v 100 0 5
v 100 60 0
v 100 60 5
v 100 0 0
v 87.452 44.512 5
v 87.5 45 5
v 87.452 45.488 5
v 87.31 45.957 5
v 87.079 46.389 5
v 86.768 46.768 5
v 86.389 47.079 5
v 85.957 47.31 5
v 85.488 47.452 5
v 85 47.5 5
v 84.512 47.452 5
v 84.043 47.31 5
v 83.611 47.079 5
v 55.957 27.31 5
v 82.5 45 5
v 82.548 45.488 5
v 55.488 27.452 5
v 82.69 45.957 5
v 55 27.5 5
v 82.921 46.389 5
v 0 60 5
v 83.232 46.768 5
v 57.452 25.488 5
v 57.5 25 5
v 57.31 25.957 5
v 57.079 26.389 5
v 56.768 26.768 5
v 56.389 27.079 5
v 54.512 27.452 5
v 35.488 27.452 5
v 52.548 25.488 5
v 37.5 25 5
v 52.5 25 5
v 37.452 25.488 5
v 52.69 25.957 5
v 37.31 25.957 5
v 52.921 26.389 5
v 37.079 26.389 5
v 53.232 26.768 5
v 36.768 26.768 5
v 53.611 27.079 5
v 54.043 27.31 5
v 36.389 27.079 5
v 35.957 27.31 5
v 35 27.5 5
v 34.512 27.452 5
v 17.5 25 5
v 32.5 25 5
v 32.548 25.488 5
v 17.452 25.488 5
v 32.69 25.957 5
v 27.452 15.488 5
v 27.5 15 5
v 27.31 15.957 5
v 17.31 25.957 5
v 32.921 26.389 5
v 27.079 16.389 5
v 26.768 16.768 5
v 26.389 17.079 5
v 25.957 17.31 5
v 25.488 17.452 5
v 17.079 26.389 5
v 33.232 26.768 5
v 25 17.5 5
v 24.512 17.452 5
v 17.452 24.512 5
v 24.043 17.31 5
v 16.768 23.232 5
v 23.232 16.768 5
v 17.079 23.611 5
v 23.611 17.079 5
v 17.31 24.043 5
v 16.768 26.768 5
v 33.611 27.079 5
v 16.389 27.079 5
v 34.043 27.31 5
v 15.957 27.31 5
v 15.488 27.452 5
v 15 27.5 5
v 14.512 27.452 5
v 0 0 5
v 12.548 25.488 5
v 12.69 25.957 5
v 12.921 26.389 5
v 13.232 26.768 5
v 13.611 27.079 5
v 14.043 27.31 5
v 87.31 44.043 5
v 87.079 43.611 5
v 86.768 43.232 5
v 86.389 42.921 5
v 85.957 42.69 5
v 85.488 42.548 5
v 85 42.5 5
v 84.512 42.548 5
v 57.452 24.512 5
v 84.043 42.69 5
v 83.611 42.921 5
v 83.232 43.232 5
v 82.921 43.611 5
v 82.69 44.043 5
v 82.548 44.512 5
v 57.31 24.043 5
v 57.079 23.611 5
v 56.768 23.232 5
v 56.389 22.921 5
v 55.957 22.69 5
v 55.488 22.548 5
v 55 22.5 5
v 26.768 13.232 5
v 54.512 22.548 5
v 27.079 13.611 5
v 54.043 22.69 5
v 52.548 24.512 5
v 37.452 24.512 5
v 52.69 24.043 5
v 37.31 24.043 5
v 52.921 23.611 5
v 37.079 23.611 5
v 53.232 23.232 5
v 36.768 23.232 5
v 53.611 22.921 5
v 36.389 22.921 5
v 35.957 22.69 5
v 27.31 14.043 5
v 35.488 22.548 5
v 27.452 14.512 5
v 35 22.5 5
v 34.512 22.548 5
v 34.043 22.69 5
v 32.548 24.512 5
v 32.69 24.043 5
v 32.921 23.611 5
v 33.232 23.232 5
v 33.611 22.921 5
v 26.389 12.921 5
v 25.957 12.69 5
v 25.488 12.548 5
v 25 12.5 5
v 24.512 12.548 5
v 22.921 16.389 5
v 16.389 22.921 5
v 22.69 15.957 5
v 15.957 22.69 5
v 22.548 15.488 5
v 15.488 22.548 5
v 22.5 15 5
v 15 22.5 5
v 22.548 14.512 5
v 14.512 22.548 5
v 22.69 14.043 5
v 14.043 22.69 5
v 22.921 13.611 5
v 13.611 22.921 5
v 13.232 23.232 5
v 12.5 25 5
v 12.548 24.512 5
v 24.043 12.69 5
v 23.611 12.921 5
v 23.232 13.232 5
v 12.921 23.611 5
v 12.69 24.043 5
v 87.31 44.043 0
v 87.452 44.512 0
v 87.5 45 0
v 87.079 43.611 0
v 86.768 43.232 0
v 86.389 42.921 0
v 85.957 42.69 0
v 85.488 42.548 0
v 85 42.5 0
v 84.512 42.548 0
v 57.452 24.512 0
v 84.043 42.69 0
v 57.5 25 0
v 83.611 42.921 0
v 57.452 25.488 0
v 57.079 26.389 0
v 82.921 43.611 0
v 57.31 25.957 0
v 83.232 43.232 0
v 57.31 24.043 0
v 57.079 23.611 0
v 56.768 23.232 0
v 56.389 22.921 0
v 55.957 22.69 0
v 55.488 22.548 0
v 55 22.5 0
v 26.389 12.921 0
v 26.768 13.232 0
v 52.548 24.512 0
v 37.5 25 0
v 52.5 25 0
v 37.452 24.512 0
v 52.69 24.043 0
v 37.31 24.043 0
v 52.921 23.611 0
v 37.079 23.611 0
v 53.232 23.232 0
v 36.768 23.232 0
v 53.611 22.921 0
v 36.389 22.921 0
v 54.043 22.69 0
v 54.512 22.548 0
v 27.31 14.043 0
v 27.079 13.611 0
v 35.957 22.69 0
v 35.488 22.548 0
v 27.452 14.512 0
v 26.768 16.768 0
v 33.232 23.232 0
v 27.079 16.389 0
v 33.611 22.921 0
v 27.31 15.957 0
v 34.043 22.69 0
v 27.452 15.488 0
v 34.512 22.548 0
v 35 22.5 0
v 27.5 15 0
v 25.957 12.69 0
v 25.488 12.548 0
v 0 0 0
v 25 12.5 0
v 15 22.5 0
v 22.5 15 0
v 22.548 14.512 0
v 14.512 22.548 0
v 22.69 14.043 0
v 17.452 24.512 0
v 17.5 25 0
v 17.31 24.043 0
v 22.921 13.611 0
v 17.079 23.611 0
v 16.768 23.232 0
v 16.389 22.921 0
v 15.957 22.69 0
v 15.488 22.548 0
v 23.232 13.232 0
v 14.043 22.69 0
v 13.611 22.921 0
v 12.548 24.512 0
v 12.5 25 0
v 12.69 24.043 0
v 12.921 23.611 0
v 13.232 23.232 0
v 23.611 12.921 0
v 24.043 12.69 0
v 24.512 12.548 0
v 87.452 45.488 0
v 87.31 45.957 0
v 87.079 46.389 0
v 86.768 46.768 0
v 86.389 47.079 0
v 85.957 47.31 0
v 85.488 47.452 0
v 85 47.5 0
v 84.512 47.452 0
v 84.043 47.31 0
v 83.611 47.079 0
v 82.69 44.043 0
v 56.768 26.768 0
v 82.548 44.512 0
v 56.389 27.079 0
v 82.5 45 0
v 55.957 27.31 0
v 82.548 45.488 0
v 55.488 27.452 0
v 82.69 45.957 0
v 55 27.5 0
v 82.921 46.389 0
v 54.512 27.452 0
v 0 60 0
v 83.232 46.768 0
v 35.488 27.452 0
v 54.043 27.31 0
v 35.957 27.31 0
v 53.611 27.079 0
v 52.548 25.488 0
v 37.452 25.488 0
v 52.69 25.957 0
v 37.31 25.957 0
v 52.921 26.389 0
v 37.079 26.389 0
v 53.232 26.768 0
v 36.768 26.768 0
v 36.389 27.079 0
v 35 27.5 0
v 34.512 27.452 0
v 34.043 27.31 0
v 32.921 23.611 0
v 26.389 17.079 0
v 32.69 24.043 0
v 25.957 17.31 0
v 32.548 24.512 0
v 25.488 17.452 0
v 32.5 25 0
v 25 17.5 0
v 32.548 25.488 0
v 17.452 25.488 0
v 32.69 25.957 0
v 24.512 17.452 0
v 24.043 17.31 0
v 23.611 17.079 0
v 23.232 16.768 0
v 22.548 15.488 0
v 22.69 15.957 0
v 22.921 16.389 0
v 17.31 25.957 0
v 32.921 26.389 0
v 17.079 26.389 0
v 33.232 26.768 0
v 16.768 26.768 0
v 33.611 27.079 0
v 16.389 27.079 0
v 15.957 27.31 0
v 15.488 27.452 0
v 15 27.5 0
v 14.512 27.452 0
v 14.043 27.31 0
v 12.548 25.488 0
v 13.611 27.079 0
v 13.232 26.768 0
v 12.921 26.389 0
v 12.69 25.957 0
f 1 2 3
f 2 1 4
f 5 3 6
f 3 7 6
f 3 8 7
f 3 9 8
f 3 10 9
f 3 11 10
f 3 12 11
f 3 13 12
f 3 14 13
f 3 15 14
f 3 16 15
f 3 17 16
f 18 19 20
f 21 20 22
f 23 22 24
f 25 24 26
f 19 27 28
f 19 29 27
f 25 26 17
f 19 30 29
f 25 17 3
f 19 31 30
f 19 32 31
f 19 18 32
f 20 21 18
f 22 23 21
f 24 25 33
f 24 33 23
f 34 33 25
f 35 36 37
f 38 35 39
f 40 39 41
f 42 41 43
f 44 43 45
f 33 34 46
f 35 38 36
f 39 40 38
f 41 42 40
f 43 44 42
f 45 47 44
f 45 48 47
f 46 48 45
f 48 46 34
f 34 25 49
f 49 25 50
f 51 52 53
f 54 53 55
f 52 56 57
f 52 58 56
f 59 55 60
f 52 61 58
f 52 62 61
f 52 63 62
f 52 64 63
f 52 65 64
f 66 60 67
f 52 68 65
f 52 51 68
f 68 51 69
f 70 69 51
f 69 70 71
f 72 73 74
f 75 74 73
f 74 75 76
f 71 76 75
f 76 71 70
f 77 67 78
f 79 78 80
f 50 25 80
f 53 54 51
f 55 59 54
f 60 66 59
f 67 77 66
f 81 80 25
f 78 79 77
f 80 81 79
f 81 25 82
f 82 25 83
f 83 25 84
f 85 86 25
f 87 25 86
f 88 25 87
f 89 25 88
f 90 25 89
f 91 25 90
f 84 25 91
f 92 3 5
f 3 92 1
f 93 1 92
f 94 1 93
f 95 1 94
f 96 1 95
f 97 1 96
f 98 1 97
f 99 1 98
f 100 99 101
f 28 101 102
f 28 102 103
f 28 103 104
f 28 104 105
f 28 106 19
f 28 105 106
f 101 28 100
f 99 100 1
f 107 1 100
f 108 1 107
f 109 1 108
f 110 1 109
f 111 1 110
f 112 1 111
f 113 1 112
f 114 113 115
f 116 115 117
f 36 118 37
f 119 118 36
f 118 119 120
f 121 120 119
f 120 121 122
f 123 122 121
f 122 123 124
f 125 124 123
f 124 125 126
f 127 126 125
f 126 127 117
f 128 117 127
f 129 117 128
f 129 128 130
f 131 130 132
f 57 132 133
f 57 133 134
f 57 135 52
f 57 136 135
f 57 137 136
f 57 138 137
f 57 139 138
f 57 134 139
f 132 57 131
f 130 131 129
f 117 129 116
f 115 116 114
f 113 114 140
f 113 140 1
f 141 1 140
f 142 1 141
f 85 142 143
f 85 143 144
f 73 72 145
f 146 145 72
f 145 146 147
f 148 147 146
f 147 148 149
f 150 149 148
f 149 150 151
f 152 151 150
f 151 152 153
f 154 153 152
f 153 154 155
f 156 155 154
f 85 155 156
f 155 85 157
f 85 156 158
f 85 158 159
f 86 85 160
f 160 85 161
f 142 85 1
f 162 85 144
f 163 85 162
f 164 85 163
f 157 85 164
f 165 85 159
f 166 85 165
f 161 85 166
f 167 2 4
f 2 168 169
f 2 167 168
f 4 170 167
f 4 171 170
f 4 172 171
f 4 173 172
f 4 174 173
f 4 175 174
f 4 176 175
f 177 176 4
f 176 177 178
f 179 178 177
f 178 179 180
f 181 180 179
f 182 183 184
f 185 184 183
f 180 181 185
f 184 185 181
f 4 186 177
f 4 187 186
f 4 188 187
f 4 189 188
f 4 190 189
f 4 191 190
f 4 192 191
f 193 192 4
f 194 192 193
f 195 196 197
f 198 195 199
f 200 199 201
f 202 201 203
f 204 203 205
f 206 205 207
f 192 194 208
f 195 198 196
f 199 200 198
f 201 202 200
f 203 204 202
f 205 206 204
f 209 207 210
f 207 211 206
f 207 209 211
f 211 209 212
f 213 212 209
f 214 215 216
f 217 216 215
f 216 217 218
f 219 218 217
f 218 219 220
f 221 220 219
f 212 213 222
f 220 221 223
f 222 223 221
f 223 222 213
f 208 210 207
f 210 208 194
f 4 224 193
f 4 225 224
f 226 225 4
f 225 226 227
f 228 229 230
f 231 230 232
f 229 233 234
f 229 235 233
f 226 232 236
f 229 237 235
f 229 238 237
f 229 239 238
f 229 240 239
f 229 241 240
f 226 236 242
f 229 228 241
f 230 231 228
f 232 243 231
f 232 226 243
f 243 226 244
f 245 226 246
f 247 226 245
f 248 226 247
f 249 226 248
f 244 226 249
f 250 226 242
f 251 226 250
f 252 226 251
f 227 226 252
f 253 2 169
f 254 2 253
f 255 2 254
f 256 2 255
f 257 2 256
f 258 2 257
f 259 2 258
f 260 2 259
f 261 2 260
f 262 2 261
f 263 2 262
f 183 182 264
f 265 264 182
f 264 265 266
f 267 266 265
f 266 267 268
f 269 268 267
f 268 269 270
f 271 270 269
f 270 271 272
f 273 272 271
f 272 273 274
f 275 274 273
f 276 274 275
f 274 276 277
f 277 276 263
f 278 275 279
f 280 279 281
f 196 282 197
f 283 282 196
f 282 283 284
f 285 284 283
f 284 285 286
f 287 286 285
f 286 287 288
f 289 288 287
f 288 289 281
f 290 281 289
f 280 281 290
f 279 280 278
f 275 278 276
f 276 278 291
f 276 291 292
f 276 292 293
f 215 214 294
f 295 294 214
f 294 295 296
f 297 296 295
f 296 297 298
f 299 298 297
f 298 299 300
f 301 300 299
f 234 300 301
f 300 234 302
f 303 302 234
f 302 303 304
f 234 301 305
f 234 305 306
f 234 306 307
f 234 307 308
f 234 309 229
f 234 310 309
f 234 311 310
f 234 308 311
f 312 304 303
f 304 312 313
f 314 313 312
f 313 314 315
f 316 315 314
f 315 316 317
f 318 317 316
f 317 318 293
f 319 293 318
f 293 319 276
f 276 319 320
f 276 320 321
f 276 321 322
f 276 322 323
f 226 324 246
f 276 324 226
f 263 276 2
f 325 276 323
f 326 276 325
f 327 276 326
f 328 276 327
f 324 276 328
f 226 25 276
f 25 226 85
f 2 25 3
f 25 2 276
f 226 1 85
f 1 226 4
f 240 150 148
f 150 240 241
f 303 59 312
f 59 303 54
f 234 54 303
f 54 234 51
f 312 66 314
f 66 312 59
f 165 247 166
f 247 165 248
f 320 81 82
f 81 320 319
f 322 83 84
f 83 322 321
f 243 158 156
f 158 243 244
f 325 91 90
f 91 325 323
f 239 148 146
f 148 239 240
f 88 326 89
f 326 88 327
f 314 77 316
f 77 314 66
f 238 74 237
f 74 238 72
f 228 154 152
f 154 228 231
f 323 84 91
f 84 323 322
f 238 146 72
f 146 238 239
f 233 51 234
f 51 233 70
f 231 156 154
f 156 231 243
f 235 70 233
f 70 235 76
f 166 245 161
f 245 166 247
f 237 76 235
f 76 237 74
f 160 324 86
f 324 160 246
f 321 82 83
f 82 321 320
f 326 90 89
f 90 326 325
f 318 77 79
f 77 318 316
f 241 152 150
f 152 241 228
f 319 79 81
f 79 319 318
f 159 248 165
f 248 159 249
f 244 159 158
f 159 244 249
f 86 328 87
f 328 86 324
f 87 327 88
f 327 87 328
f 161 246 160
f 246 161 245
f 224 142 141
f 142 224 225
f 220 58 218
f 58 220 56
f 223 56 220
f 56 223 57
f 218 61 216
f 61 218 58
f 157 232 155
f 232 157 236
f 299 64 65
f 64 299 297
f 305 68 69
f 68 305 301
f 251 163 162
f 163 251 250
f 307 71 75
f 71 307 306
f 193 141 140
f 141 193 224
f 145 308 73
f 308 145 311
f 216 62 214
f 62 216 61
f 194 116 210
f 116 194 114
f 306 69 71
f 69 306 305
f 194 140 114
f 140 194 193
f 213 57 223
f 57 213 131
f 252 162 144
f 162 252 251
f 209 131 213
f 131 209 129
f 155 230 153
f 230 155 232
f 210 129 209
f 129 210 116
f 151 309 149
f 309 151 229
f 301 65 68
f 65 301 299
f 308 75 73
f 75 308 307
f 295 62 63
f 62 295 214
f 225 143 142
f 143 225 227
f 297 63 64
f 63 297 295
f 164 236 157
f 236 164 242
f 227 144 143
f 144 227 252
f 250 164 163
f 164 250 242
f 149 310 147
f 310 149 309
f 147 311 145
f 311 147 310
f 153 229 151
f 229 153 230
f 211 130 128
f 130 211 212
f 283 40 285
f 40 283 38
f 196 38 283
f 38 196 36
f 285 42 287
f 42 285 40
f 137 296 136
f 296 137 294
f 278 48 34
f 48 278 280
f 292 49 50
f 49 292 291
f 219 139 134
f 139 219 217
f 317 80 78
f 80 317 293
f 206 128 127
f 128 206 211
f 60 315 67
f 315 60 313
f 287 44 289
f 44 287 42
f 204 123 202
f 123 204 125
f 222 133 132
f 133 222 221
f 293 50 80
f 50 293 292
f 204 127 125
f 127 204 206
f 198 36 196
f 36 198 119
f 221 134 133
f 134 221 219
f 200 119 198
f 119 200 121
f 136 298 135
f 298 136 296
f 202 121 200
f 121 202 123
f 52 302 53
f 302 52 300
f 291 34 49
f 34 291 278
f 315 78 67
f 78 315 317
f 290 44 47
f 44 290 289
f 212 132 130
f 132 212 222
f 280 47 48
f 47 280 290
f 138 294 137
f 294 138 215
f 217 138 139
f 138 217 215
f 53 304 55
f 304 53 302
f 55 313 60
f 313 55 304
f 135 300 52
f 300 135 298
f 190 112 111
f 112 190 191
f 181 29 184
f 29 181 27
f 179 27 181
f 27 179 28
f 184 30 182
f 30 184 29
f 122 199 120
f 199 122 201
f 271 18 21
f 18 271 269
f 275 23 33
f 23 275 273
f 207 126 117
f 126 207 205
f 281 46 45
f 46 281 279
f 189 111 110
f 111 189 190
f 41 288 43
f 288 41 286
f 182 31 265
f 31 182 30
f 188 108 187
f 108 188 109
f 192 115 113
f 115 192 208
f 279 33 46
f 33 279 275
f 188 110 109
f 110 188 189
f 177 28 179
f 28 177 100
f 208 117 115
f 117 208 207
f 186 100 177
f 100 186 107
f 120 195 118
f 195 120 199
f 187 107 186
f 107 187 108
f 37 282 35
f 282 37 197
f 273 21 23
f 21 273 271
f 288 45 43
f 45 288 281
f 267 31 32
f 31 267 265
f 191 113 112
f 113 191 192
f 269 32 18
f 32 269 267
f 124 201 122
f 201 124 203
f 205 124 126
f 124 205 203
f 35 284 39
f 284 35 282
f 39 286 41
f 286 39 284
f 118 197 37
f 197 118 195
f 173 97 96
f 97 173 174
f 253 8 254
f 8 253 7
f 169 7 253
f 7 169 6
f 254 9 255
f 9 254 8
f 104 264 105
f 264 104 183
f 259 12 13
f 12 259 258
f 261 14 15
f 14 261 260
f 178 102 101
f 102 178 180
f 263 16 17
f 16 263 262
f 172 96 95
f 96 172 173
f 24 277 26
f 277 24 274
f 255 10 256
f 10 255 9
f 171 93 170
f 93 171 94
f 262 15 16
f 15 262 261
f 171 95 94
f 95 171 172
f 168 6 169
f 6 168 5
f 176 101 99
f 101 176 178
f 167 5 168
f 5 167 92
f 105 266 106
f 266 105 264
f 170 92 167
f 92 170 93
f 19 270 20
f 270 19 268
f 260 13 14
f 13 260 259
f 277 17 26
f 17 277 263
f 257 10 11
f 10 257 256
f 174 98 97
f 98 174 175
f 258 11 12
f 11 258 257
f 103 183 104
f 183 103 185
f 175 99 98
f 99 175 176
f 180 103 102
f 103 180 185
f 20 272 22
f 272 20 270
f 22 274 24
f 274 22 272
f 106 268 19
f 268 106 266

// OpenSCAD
$fn = 32;

// ----------------------------------------------------------------------
// Hole field: plate with holes at given coordinates
// ----------------------------------------------------------------------

// --- parameters (mm) ---
plate_l = 100;            // plate length, X
plate_w = 60;             // plate width, Y
plate_t = 5;              // plate thickness, Z
hole_d = 5;               // hole diameter

difference() {
  cube([plate_l, plate_w, plate_t]);
  translate([15, 25, -1]) cylinder(h = plate_t + 2, d = hole_d);
  translate([25, 15, -1]) cylinder(h = plate_t + 2, d = hole_d);
  translate([35, 25, -1]) cylinder(h = plate_t + 2, d = hole_d);
  translate([55, 25, -1]) cylinder(h = plate_t + 2, d = hole_d);
  translate([85, 45, -1]) cylinder(h = plate_t + 2, d = hole_d);
}
